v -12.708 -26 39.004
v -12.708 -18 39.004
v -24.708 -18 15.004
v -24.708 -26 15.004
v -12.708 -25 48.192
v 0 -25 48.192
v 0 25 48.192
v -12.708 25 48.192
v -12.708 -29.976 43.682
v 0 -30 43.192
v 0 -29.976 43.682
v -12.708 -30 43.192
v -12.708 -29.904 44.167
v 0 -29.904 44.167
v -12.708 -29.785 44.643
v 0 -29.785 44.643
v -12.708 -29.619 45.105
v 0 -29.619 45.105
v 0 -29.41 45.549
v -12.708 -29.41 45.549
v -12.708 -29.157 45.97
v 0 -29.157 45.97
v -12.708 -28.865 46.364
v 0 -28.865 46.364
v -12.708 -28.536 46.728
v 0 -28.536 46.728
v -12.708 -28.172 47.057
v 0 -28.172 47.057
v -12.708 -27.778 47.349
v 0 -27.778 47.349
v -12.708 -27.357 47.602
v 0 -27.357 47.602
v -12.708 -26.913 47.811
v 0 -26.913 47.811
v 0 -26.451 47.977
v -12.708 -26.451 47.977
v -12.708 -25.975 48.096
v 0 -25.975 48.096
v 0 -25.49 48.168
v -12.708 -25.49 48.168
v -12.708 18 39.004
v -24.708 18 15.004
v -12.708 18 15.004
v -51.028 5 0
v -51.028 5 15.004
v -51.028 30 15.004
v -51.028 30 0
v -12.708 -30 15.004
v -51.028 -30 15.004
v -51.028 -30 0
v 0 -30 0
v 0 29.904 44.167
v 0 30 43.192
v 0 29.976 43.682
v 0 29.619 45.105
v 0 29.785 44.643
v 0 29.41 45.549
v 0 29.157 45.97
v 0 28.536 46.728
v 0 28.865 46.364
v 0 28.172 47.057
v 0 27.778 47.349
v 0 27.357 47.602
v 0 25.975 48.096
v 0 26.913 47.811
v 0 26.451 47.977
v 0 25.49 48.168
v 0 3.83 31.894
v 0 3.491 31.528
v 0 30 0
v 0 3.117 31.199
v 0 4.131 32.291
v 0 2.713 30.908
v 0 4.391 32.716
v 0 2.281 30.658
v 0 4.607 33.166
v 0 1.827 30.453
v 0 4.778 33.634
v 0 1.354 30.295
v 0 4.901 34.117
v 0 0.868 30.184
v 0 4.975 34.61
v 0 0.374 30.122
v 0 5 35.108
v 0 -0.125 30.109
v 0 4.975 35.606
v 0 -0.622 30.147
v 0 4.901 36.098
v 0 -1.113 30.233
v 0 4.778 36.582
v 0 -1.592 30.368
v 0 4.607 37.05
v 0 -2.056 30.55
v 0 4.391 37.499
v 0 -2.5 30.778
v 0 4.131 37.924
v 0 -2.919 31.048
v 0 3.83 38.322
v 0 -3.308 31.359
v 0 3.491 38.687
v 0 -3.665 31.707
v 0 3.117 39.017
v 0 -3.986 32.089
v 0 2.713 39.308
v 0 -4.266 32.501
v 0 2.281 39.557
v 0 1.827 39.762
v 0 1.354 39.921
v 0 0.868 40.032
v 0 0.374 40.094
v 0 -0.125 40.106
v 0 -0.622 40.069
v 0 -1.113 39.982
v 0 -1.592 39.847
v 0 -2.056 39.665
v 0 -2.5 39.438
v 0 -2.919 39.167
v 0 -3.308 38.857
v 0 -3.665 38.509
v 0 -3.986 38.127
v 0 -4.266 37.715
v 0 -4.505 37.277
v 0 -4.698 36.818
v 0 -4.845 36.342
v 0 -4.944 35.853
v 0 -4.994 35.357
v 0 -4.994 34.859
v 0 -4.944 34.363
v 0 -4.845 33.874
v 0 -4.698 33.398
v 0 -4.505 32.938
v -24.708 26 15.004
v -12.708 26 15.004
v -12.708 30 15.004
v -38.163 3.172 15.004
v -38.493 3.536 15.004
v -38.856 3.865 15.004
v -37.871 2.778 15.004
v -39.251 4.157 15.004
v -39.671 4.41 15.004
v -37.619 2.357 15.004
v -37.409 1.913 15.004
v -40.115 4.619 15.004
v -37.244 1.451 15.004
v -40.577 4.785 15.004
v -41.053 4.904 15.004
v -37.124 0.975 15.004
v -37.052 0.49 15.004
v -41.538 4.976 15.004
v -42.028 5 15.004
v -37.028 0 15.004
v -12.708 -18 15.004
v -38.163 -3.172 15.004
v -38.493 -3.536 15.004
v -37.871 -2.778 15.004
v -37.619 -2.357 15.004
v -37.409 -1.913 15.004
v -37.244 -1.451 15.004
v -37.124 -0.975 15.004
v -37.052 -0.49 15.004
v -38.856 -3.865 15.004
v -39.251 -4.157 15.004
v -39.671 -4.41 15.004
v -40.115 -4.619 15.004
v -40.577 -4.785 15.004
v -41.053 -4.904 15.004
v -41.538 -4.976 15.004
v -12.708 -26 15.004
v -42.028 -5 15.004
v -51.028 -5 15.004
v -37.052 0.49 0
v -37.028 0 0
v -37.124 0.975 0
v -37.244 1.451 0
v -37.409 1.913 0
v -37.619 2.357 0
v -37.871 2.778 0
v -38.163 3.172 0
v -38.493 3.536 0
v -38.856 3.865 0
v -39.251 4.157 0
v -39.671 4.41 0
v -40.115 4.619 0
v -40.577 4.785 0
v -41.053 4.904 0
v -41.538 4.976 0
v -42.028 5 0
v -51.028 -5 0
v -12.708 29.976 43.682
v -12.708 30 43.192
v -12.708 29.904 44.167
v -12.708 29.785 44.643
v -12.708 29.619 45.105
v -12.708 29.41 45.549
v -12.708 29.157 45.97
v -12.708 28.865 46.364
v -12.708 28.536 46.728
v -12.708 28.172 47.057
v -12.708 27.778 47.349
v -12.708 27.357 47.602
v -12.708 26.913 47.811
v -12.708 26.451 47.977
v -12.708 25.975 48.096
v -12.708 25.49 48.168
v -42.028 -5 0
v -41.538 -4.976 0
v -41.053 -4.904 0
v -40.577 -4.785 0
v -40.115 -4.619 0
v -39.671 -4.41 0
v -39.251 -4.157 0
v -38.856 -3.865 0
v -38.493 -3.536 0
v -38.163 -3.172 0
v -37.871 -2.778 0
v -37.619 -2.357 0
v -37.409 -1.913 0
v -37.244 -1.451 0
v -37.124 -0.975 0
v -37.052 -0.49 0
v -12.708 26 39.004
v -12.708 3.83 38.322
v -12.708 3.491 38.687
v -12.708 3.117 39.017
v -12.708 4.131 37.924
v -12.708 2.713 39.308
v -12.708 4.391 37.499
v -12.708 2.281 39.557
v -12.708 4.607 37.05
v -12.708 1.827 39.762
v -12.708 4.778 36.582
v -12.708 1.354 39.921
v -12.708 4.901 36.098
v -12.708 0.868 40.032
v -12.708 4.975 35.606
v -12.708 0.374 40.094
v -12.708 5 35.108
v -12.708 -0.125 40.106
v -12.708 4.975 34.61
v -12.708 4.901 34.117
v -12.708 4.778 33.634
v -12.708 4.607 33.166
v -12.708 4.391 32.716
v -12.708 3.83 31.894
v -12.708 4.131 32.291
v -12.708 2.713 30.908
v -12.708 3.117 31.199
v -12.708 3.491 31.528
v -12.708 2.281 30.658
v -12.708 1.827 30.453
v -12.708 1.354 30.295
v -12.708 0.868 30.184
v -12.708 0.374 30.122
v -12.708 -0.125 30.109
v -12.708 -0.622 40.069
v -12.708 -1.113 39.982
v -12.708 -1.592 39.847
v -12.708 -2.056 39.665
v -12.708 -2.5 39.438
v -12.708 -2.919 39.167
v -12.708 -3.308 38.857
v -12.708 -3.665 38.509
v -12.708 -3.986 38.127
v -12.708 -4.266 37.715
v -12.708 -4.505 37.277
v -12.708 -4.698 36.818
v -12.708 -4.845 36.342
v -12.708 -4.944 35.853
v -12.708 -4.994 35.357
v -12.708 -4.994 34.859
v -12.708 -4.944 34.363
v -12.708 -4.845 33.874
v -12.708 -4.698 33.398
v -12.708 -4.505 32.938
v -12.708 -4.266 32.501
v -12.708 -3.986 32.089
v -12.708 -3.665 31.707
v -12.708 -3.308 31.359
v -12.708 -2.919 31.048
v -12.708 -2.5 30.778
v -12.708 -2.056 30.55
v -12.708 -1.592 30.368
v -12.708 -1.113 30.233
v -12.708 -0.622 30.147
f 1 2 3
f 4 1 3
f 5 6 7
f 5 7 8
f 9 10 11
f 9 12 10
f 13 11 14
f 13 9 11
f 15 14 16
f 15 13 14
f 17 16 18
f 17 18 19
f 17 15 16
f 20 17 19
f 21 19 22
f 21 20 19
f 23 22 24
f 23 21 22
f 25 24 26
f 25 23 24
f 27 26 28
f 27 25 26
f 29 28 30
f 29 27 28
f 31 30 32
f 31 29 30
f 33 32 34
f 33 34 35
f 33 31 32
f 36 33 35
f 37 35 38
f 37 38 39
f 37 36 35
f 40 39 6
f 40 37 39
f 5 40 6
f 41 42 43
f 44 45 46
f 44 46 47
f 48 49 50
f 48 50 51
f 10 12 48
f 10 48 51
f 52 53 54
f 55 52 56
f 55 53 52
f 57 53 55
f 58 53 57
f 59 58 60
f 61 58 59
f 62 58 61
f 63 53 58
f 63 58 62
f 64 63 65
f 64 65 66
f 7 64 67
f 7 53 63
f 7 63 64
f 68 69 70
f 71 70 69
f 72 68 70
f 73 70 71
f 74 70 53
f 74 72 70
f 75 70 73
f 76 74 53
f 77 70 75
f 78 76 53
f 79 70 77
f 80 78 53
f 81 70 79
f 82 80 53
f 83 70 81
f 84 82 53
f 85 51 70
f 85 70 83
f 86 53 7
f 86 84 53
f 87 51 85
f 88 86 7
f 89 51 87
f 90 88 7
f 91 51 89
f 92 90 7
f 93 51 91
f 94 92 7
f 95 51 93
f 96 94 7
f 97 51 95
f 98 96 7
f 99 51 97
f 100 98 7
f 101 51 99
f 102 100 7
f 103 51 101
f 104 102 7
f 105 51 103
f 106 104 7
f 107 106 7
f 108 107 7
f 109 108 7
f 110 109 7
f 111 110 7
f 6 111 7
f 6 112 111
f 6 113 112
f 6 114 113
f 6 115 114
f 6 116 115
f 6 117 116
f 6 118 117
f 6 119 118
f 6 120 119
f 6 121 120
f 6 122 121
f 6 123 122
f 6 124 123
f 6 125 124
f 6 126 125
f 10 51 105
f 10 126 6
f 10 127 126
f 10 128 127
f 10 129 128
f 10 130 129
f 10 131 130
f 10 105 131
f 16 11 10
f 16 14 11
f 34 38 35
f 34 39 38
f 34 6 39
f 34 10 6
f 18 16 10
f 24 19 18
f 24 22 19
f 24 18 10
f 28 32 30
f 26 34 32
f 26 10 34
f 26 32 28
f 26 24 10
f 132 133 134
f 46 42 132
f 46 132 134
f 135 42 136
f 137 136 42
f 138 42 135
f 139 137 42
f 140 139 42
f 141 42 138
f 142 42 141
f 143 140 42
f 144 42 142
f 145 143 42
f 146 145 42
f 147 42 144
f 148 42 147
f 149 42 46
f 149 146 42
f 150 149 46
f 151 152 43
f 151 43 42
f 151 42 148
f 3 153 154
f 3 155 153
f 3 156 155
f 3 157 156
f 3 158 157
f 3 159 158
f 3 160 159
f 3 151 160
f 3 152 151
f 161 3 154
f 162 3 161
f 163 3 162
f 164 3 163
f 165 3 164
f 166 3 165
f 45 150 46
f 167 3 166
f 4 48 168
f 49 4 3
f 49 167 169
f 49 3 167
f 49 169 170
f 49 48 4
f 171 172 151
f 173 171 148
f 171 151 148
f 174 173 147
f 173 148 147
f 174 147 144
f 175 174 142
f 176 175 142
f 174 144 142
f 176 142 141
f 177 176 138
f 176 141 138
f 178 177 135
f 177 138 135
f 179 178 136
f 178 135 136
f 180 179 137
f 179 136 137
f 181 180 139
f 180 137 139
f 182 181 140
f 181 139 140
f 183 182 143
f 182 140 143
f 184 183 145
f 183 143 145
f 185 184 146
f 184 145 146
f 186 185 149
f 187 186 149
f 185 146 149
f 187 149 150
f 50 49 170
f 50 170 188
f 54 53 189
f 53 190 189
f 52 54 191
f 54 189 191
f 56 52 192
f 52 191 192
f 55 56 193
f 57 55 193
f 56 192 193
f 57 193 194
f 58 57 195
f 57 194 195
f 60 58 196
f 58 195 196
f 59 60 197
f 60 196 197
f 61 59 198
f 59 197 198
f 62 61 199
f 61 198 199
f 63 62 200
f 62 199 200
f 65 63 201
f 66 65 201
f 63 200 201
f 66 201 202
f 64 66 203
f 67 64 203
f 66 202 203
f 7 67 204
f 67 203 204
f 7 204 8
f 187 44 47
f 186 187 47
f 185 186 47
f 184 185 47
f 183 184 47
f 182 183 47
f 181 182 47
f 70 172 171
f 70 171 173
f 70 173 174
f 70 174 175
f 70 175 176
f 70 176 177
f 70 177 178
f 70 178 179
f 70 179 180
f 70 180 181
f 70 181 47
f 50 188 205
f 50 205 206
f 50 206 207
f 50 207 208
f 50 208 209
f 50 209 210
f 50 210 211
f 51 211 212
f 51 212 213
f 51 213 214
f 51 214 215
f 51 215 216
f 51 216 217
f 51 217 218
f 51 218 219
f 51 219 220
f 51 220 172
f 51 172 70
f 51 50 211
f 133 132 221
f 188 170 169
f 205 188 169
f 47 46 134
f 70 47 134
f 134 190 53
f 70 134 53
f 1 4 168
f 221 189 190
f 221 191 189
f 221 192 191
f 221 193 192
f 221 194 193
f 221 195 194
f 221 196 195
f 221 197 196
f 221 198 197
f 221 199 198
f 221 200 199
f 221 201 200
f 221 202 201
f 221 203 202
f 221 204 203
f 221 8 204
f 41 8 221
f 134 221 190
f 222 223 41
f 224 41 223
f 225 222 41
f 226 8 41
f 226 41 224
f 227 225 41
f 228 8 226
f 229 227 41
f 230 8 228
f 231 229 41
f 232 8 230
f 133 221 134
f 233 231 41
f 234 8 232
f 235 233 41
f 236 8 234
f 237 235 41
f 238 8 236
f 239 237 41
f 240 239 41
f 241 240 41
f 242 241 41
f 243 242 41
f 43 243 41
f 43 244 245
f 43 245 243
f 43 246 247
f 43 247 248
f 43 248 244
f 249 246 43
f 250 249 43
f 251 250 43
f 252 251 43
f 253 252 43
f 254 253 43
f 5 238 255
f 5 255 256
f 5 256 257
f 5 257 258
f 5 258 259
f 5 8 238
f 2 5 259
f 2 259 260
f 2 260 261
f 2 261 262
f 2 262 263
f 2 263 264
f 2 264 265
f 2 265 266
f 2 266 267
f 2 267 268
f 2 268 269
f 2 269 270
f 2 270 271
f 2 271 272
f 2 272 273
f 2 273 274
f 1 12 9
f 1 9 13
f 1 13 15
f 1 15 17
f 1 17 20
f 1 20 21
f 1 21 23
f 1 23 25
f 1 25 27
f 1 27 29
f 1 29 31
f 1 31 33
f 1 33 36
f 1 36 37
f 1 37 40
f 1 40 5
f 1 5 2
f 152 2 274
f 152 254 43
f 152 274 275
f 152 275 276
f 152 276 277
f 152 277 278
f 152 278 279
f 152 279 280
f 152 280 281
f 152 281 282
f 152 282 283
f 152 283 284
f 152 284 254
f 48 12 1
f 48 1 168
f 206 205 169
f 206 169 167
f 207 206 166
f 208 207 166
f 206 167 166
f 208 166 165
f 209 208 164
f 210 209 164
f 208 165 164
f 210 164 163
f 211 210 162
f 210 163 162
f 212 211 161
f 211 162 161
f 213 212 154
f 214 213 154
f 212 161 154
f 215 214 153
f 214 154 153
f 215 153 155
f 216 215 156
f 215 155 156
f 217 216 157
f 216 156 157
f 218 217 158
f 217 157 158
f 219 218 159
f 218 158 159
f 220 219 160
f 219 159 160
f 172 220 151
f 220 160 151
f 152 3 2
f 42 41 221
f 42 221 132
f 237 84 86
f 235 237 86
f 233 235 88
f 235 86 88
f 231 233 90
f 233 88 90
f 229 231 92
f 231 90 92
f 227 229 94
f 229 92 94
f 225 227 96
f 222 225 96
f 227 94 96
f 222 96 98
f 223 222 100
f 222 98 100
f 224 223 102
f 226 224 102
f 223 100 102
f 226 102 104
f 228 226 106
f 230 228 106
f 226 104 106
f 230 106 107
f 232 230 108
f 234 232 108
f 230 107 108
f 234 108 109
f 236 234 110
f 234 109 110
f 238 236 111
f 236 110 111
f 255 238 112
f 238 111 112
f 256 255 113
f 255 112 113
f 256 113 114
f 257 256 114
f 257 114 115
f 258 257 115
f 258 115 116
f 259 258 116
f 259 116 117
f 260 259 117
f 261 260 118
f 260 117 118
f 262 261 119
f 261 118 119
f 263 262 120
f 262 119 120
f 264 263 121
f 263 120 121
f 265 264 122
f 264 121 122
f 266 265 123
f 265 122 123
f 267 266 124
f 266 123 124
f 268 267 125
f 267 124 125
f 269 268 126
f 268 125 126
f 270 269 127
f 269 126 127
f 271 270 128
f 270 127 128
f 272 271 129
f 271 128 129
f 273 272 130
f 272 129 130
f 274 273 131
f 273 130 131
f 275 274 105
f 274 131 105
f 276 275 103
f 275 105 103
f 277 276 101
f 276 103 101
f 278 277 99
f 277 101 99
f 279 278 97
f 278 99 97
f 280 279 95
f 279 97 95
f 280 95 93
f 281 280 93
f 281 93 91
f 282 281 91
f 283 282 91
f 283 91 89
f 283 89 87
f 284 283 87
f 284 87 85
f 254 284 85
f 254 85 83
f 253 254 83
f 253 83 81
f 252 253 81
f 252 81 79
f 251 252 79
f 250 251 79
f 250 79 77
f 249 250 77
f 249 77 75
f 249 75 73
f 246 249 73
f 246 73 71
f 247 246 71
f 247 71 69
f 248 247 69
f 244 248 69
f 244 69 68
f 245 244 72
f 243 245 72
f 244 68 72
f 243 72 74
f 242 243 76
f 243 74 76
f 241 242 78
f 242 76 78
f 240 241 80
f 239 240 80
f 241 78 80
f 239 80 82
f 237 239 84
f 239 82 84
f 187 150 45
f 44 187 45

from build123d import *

# Parameters (mm, degrees)
F1_DEPTH = 30
F2_R     = 5
F3_DEPTH = 12.7077577636
F5_DEPTH = 15.0035852566
F8_DEPTH = 8
F11_R    = 5


# Not quite as in the source:
# - a pattern or mirror of a feature is missing from the dataset's text; its kind, count and spacing are read off the source's solid
# - the program builds the solid bodies; features that only make, move or delete a surface that nothing else refers to are left out


with BuildPart() as f1:
    # F0 (on Front) → F1 (new body, symmetric)
    with BuildSketch(Plane.XZ):
        Polygon((-51.0283857584, 15.0035852566), (-51.0283857584, 0), (0, 0), (0, 48.1919869781), (-12.7077577636, 48.1919869781), (-12.7077577636, 15.0035852566), align=None)
    extrude(amount=F1_DEPTH, both=True)

    # F2 (on face) → F3 (cut, through all)
    with BuildSketch(Plane.YZ):
        with Locations((0, 35.1077616215)):
            Circle(F2_R)
    extrude(amount=-F3_DEPTH, mode=Mode.SUBTRACT)

    # F4 (on face) → F5 (cut, through all)
    with BuildSketch(Plane.XY.offset(15.0035852566)):
        with BuildLine():
            ThreePointArc((-42.0283857584, -5), (-38.4928518525, -3.5355339059), (-37.0283857584, 0))
            ThreePointArc((-37.0283857584, 0), (-38.4928518525, 3.5355339059), (-42.0283857584, 5))
            ThreePointArc((-42.0283857584, 5), (-47.0283857584, 0), (-42.0283857584, -5))
        make_face()
        with BuildLine():
            ThreePointArc((-42.0283857584, -5), (-47.0283857584, 0), (-42.0283857584, 5))
            Line((-42.0283857584, 5), (-51.0283857584, 5))
            Line((-51.0283857584, 5), (-51.0283857584, -5))
            Line((-51.0283857584, -5), (-42.0283857584, -5))
        make_face()
    extrude(amount=-F5_DEPTH, mode=Mode.SUBTRACT)

    # F7 (on offset) → F8 (join)
    with BuildSketch(Plane.XZ.offset(18)):
        Polygon((-12.7077577636, 39.0035852566), (-24.7077577636, 15.0035852566), (-12.7077577636, 15.0035852566), align=None)
    f8 = extrude(amount=F8_DEPTH)

    # F8_copies: F8 across plane
    add(f8.mirror(Plane.ZX))

    # F11
    f11_edges = [f1.edges().sort_by_distance(p)[0] for p in [
        (-6.353879, 30, 48.191987),
        (-6.353879, -30, 48.191987),
    ]]
    fillet(f11_edges, radius=F11_R)


solid = f1.part
